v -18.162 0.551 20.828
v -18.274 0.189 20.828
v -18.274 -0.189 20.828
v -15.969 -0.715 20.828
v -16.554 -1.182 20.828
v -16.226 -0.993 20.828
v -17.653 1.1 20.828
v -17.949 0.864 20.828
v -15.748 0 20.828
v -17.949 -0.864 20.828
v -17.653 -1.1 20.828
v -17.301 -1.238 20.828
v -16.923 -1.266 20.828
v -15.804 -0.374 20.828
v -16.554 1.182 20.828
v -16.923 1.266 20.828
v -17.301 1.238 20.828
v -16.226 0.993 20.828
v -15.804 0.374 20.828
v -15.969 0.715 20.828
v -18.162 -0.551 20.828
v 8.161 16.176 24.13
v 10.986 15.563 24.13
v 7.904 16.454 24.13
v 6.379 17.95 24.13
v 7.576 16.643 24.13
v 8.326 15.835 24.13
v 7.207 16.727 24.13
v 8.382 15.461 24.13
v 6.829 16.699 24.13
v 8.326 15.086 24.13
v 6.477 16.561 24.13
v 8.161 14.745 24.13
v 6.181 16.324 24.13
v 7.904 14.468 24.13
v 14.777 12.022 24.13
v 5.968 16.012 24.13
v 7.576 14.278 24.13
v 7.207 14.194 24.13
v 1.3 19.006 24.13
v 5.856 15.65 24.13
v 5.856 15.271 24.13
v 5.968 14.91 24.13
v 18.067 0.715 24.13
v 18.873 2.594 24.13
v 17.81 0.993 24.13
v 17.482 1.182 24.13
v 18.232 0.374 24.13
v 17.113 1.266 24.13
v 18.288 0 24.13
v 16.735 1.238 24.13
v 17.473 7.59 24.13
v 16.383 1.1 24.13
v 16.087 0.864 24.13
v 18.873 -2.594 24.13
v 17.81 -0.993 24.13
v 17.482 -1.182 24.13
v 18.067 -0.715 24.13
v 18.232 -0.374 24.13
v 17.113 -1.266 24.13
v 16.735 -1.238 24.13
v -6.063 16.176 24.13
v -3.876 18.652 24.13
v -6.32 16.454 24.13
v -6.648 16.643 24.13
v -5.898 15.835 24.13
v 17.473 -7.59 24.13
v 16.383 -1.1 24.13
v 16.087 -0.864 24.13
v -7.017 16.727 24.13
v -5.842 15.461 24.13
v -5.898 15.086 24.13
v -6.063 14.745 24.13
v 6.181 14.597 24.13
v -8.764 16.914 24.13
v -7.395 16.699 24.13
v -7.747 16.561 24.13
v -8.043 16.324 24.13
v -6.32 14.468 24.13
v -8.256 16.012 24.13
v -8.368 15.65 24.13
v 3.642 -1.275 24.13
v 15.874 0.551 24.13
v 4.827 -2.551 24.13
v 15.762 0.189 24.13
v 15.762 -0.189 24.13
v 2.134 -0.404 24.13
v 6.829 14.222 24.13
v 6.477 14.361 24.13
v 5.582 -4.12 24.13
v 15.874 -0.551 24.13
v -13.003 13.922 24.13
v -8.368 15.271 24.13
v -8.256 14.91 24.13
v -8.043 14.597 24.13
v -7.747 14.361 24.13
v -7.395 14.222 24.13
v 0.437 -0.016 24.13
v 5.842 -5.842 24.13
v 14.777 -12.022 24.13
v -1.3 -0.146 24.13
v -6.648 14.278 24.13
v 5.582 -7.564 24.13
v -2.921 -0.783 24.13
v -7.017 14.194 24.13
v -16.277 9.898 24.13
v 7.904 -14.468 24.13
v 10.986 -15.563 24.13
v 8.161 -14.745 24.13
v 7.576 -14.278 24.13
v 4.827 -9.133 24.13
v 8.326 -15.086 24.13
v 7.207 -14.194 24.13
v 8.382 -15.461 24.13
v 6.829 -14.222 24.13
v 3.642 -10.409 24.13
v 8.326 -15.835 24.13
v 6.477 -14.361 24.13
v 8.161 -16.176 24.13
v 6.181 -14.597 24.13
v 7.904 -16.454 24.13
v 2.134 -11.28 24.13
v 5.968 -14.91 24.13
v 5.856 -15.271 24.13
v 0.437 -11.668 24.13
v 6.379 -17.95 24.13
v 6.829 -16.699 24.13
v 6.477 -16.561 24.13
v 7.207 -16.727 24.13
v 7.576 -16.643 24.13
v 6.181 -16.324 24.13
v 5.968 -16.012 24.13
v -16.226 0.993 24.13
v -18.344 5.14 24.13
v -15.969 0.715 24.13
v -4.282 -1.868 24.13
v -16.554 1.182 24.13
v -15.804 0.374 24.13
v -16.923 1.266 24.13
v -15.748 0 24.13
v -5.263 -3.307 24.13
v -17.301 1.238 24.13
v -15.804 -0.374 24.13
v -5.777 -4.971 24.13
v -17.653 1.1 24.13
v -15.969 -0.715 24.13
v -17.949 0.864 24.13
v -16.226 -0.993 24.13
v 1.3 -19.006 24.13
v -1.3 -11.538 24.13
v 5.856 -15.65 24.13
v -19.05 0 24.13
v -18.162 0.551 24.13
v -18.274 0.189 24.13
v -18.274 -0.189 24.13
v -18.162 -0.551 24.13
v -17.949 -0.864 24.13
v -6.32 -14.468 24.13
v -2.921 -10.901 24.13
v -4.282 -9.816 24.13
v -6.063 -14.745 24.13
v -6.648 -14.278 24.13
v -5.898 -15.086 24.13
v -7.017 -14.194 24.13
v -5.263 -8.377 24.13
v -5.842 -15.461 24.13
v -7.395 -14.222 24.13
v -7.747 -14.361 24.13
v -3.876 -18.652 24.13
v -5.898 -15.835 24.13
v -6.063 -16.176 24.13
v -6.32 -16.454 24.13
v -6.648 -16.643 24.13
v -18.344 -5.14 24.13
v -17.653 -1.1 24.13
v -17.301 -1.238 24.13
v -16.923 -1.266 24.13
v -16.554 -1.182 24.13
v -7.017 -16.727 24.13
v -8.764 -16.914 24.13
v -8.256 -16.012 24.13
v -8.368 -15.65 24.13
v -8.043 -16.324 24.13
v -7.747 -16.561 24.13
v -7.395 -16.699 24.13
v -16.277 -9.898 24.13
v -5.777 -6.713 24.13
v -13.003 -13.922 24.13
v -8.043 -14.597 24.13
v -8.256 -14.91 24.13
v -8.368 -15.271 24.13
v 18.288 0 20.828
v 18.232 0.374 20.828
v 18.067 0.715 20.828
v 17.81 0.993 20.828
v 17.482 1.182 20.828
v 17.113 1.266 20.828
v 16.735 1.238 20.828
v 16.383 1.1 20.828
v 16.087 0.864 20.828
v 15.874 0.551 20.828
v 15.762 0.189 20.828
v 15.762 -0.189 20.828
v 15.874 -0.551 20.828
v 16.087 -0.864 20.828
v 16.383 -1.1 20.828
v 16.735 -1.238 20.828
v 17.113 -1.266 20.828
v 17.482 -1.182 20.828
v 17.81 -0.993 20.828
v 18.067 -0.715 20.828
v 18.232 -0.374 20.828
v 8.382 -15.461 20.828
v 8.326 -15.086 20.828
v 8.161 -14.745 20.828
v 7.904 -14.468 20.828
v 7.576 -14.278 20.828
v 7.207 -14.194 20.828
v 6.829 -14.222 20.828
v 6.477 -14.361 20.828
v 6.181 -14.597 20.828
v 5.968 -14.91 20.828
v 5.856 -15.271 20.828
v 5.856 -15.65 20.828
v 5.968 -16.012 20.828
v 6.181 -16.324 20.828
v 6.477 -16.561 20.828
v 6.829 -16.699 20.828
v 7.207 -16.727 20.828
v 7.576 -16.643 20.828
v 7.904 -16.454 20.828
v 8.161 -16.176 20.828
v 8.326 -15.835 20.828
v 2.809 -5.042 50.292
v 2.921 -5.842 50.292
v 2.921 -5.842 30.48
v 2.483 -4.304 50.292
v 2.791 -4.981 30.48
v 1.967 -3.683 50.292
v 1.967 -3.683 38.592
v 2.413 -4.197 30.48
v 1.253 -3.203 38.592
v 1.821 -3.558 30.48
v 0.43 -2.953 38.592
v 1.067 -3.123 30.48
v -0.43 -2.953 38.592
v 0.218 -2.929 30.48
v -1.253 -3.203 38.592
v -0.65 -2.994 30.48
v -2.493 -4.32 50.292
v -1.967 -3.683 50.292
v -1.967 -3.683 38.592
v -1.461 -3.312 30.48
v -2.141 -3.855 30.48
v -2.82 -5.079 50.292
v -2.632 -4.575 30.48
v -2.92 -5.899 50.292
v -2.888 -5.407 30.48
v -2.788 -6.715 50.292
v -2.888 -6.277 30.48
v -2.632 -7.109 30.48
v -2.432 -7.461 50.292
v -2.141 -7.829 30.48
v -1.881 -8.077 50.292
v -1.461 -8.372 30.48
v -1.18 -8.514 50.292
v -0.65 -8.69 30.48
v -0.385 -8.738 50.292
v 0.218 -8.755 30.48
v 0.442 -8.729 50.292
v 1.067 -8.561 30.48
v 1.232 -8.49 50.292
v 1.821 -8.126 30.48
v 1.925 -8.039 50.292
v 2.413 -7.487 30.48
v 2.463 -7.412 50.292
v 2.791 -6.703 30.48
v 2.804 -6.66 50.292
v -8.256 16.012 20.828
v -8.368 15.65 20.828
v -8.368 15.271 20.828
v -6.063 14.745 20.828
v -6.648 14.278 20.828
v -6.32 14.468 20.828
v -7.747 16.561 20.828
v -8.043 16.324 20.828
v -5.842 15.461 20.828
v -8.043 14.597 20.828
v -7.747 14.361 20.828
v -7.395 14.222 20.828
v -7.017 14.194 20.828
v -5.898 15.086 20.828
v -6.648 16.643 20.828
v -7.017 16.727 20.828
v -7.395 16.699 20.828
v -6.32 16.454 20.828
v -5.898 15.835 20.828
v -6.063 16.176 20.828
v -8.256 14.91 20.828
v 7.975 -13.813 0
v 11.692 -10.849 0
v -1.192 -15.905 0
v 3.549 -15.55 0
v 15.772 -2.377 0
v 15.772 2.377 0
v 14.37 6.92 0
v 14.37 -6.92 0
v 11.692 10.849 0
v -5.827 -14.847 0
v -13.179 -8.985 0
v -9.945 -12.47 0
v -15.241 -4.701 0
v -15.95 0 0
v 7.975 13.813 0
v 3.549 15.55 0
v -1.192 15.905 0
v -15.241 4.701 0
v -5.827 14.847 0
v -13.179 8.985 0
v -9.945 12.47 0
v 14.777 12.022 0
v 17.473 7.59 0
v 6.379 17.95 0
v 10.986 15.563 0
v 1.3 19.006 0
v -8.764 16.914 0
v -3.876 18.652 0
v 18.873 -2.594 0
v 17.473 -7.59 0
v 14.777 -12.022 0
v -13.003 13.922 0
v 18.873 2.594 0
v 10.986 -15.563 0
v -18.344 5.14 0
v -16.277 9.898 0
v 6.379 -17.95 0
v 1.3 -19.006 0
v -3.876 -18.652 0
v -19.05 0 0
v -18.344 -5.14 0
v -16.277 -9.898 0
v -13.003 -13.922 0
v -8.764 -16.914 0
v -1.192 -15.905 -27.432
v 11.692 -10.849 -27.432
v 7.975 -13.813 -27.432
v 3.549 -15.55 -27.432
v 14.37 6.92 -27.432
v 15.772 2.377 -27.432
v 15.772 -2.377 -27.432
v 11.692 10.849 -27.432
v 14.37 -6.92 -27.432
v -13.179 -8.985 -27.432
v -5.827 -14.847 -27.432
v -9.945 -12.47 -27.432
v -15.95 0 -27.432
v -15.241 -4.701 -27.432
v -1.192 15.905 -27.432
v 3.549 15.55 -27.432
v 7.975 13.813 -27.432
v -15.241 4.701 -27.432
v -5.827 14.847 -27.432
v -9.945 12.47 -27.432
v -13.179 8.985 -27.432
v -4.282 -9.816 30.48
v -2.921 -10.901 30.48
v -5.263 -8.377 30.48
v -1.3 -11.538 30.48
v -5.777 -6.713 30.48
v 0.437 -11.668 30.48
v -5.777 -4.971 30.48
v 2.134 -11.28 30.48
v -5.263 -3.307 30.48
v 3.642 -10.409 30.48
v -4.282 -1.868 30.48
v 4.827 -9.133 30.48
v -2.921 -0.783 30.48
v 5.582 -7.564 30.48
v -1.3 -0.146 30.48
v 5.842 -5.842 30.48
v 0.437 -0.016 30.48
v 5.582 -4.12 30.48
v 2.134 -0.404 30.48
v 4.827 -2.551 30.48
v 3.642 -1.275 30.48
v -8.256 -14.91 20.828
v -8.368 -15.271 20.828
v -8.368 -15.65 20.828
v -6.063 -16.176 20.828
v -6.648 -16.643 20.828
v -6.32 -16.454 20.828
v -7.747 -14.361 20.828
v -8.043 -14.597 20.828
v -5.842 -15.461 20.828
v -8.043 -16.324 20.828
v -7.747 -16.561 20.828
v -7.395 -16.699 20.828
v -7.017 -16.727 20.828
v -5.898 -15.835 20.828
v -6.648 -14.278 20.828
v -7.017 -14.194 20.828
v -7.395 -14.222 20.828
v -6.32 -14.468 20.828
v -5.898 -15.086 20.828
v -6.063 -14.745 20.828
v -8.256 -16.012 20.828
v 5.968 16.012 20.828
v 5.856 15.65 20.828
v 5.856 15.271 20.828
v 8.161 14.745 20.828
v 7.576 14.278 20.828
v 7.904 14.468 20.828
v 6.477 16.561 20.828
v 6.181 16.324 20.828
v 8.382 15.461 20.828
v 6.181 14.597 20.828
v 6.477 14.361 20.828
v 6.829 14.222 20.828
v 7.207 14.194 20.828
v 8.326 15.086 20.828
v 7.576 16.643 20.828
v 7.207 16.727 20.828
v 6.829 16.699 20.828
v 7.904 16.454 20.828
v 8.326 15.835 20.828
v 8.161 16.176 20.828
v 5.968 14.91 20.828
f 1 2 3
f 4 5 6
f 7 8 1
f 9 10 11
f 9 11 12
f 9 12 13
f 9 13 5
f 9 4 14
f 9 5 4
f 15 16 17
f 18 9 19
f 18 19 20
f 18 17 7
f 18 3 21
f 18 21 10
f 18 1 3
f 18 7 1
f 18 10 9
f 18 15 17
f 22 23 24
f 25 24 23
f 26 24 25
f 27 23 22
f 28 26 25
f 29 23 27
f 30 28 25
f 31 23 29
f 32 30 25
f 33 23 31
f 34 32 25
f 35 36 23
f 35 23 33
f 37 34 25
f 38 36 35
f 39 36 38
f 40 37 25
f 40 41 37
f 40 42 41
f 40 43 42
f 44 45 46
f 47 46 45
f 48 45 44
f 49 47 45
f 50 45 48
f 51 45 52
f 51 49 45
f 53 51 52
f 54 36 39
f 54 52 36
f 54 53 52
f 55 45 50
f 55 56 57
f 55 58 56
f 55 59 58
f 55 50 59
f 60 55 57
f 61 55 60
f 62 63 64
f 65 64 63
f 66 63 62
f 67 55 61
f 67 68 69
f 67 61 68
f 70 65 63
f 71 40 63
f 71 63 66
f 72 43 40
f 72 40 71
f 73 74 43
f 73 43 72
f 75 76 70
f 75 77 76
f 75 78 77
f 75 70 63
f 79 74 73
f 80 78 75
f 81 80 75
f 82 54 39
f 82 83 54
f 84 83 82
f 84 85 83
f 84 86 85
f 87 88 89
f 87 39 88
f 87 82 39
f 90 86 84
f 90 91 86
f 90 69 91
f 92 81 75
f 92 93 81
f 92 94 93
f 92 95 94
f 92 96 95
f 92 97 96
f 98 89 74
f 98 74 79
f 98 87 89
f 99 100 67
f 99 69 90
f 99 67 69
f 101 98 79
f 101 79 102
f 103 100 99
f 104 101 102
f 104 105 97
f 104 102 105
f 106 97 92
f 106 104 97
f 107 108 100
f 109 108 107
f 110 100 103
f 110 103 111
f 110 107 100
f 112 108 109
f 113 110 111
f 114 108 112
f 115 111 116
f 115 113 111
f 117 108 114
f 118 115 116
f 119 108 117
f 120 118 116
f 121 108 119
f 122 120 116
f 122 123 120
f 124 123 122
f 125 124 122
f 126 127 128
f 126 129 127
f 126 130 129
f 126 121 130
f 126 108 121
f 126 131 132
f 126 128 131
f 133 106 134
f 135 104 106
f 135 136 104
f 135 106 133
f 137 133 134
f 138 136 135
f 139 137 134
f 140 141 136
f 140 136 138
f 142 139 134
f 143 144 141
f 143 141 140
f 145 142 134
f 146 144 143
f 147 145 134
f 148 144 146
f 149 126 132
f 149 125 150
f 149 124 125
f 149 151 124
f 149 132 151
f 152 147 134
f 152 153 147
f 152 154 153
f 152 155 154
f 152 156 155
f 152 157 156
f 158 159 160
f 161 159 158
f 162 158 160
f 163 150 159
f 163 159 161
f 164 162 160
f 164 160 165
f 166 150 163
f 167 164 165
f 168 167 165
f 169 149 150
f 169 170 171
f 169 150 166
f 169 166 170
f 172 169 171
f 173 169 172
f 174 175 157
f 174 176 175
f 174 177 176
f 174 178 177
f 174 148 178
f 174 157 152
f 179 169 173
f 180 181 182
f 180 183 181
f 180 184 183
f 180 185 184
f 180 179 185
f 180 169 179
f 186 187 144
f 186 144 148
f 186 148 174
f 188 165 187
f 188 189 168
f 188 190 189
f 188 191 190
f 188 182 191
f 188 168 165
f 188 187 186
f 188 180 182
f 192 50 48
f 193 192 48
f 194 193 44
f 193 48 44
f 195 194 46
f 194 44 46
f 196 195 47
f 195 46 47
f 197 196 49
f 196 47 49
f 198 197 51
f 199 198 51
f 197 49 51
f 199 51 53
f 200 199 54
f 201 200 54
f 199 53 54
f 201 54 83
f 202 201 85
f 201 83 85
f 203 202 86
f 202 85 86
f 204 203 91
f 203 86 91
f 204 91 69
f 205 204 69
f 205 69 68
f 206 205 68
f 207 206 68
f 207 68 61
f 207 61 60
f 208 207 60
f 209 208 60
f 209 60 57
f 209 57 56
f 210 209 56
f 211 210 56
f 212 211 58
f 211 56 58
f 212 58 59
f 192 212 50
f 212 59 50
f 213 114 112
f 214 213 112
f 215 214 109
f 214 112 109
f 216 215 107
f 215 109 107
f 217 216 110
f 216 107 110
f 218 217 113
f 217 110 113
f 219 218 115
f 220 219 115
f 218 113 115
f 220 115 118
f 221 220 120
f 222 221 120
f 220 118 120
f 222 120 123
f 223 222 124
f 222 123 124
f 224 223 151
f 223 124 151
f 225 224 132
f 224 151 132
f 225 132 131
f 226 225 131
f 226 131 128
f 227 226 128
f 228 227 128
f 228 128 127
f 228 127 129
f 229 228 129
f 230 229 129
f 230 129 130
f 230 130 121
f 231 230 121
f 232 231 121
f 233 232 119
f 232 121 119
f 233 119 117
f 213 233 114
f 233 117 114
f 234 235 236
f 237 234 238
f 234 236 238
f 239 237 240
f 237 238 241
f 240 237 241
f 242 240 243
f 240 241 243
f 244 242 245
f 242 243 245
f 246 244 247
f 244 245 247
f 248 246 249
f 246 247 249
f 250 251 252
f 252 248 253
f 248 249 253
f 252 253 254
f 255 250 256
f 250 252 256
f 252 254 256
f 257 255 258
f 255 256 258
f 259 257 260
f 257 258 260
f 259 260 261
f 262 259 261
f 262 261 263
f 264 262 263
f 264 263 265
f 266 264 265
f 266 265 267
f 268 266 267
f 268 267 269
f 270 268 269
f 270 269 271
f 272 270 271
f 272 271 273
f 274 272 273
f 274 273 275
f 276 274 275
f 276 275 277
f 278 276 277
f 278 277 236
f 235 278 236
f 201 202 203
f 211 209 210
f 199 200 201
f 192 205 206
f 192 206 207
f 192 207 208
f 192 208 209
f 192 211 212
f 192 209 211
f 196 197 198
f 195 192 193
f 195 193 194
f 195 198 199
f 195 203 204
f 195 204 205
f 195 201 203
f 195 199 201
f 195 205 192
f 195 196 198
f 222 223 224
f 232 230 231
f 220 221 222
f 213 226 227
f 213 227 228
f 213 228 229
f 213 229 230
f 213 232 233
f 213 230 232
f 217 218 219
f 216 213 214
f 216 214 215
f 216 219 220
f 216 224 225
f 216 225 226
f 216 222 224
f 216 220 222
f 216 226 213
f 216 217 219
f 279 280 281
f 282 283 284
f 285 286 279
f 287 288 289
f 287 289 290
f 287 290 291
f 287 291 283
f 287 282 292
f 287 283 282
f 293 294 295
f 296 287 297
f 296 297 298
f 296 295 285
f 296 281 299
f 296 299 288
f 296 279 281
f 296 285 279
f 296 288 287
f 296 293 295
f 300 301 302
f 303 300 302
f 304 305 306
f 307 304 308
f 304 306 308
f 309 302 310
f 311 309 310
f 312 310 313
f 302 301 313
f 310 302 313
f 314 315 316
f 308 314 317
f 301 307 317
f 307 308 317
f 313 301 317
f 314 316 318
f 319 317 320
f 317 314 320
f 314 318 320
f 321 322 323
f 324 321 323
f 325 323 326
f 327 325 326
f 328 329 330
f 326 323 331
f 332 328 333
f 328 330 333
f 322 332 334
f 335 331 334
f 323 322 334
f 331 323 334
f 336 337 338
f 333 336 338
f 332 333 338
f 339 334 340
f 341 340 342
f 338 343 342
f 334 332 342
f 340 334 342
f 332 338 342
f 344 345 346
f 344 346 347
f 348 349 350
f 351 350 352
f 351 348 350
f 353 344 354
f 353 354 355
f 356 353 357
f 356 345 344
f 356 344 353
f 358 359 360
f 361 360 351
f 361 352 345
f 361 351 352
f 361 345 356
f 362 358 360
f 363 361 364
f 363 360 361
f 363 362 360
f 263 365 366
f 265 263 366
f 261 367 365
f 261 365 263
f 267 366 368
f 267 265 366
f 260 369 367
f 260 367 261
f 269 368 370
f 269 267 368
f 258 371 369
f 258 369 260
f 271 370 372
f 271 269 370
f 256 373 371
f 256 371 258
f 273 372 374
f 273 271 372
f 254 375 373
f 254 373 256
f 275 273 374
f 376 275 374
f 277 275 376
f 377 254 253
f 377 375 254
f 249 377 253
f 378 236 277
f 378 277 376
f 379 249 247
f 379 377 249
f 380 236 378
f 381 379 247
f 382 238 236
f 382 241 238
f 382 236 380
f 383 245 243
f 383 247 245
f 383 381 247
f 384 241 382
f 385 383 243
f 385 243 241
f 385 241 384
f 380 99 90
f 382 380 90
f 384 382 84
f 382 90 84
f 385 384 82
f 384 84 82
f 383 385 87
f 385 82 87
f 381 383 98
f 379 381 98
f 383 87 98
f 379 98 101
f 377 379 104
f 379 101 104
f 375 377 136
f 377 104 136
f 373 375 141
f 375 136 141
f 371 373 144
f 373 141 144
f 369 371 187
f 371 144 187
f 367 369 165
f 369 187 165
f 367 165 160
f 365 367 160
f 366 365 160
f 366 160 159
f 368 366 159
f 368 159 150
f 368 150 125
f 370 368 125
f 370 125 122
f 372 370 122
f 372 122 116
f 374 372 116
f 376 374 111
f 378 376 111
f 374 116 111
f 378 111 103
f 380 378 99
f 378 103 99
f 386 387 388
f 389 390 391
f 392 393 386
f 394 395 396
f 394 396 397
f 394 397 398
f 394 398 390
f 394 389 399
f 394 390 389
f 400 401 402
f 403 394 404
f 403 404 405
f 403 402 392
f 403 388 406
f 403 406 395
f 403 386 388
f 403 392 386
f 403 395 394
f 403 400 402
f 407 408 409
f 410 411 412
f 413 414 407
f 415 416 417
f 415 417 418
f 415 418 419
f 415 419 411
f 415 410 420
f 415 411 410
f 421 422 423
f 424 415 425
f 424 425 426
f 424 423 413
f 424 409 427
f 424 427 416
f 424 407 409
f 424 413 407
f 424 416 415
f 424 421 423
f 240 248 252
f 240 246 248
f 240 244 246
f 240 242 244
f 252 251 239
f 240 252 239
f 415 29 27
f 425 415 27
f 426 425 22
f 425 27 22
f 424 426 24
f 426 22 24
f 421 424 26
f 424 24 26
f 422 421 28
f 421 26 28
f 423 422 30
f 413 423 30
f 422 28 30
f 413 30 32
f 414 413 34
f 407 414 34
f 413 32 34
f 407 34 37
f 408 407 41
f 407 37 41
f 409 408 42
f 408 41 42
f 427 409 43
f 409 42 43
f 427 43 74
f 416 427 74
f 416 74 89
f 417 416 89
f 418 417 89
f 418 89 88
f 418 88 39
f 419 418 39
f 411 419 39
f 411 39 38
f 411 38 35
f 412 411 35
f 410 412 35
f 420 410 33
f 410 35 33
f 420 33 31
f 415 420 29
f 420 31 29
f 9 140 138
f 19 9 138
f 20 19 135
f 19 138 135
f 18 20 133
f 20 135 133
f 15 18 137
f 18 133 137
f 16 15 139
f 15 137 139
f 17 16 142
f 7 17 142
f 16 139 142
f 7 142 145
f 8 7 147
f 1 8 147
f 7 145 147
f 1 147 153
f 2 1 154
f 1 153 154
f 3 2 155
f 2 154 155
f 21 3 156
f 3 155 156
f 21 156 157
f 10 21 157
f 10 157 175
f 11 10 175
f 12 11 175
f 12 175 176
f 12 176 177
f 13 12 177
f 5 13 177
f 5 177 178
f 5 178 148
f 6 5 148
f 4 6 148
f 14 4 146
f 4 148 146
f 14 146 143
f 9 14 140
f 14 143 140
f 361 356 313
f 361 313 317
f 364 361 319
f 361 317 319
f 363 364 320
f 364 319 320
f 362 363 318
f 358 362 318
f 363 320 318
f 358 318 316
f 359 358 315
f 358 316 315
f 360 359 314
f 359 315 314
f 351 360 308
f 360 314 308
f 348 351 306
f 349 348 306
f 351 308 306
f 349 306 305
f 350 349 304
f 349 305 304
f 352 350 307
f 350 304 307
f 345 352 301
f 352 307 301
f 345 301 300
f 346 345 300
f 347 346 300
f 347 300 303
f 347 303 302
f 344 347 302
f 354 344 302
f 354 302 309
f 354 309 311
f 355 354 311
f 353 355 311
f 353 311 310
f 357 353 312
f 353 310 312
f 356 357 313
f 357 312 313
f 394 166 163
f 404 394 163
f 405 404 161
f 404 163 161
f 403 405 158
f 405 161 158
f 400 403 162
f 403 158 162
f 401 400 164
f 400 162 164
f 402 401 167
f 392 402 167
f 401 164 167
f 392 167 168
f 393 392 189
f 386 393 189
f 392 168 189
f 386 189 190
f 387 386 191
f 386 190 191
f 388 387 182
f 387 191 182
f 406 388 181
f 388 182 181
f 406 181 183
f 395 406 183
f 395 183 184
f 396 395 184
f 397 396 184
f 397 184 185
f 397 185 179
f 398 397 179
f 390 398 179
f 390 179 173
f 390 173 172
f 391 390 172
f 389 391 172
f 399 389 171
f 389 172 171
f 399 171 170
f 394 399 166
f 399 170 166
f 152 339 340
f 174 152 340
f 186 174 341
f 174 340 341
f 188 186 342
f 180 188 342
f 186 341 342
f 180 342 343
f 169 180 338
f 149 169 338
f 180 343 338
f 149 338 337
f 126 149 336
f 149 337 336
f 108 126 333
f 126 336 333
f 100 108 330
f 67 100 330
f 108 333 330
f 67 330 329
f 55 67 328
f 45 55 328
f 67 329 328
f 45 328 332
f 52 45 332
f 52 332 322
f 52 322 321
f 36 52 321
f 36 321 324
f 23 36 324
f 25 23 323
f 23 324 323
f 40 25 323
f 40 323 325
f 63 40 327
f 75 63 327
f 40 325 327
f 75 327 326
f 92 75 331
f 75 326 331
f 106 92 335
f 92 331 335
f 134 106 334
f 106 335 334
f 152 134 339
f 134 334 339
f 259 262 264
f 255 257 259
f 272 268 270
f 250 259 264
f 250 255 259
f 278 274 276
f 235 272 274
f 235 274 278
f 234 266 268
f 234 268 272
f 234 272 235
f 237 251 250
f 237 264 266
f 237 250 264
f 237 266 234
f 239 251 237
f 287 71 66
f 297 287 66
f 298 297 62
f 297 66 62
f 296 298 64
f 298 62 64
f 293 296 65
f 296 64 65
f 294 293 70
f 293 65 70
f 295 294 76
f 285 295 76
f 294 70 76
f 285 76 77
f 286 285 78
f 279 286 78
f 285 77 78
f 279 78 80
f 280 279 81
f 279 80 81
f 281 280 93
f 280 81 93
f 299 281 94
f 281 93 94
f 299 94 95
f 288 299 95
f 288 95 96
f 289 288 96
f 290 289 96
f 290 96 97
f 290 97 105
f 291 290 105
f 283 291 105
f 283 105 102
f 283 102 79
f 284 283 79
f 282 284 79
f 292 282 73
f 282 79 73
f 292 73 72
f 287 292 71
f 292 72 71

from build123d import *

# Parameters (mm, degrees)
SKETCH1_R           = 19.05
BOSS_EXTRUDE1_DEPTH = 24.13
SKETCH2_R           = 15.949999977
BOSS_EXTRUDE2_DEPTH = 27.432
SKETCH3_R           = 5.842
BOSS_EXTRUDE3_DEPTH = 6.35
SKETCH4_R           = 2.921
BOSS_EXTRUDE4_DEPTH = 19.812
SKETCH5_W           = 3.93495108
SKETCH5_H           = 0.762
CUT_EXTRUDE1_DEPTH  = 11.699999968
SKETCH6_R           = 1.27
CUT_EXTRUDE2_DEPTH  = 3.302


with BuildPart() as part:
    # Sketch1 → Boss-Extrude1 (new body)
    with BuildSketch(Plane.XY):
        with Locations(Location((0, 0, 0), (0, 0, 180))):
            Circle(SKETCH1_R)
    extrude(amount=BOSS_EXTRUDE1_DEPTH)

    # Sketch3 → Boss-Extrude3 (add)
    with BuildSketch(Plane.XY.offset(24.13)):
        with Locations((0, -5.842)):
            Circle(SKETCH3_R)
    extrude(amount=BOSS_EXTRUDE3_DEPTH)

    # Sketch4 → Boss-Extrude4 (add)
    with BuildSketch(Plane.XY.offset(30.48)):
        with Locations((0, -5.842)):
            Circle(SKETCH4_R)
    extrude(amount=BOSS_EXTRUDE4_DEPTH)

    # Sketch5 → Cut-Extrude1 (cut)
    with BuildSketch(Plane.XY.offset(50.292)):
        with Locations((0, -3.302)):
            Rectangle(SKETCH5_W, SKETCH5_H)
    extrude(amount=-CUT_EXTRUDE1_DEPTH, mode=Mode.SUBTRACT)

    # Sketch6 → Cut-Extrude2 (cut)
    with BuildSketch(Plane.XY.offset(24.13)):
        with Locations((-7.112, 15.460652638)):
            Circle(SKETCH6_R)
        with Locations((-7.112, -15.460652638)):
            Circle(SKETCH6_R)
        with Locations((-17.018, 0)):
            Circle(SKETCH6_R)
        with Locations((7.112, 15.460652638)):
            Circle(SKETCH6_R)
        with Locations((7.112, -15.460652638)):
            Circle(SKETCH6_R)
        with Locations((17.018, 0)):
            Circle(SKETCH6_R)
    extrude(amount=-CUT_EXTRUDE2_DEPTH, mode=Mode.SUBTRACT)


with BuildPart() as body_2:
    # Sketch2 → Boss-Extrude2 (new body)
    with BuildSketch(Plane(origin=(0, 0, 0), x_dir=(-1, 0, 0), z_dir=(0, 0, -1))):
        Circle(SKETCH2_R)
    extrude(amount=BOSS_EXTRUDE2_DEPTH)


solid = Compound([part.part, body_2.part])
